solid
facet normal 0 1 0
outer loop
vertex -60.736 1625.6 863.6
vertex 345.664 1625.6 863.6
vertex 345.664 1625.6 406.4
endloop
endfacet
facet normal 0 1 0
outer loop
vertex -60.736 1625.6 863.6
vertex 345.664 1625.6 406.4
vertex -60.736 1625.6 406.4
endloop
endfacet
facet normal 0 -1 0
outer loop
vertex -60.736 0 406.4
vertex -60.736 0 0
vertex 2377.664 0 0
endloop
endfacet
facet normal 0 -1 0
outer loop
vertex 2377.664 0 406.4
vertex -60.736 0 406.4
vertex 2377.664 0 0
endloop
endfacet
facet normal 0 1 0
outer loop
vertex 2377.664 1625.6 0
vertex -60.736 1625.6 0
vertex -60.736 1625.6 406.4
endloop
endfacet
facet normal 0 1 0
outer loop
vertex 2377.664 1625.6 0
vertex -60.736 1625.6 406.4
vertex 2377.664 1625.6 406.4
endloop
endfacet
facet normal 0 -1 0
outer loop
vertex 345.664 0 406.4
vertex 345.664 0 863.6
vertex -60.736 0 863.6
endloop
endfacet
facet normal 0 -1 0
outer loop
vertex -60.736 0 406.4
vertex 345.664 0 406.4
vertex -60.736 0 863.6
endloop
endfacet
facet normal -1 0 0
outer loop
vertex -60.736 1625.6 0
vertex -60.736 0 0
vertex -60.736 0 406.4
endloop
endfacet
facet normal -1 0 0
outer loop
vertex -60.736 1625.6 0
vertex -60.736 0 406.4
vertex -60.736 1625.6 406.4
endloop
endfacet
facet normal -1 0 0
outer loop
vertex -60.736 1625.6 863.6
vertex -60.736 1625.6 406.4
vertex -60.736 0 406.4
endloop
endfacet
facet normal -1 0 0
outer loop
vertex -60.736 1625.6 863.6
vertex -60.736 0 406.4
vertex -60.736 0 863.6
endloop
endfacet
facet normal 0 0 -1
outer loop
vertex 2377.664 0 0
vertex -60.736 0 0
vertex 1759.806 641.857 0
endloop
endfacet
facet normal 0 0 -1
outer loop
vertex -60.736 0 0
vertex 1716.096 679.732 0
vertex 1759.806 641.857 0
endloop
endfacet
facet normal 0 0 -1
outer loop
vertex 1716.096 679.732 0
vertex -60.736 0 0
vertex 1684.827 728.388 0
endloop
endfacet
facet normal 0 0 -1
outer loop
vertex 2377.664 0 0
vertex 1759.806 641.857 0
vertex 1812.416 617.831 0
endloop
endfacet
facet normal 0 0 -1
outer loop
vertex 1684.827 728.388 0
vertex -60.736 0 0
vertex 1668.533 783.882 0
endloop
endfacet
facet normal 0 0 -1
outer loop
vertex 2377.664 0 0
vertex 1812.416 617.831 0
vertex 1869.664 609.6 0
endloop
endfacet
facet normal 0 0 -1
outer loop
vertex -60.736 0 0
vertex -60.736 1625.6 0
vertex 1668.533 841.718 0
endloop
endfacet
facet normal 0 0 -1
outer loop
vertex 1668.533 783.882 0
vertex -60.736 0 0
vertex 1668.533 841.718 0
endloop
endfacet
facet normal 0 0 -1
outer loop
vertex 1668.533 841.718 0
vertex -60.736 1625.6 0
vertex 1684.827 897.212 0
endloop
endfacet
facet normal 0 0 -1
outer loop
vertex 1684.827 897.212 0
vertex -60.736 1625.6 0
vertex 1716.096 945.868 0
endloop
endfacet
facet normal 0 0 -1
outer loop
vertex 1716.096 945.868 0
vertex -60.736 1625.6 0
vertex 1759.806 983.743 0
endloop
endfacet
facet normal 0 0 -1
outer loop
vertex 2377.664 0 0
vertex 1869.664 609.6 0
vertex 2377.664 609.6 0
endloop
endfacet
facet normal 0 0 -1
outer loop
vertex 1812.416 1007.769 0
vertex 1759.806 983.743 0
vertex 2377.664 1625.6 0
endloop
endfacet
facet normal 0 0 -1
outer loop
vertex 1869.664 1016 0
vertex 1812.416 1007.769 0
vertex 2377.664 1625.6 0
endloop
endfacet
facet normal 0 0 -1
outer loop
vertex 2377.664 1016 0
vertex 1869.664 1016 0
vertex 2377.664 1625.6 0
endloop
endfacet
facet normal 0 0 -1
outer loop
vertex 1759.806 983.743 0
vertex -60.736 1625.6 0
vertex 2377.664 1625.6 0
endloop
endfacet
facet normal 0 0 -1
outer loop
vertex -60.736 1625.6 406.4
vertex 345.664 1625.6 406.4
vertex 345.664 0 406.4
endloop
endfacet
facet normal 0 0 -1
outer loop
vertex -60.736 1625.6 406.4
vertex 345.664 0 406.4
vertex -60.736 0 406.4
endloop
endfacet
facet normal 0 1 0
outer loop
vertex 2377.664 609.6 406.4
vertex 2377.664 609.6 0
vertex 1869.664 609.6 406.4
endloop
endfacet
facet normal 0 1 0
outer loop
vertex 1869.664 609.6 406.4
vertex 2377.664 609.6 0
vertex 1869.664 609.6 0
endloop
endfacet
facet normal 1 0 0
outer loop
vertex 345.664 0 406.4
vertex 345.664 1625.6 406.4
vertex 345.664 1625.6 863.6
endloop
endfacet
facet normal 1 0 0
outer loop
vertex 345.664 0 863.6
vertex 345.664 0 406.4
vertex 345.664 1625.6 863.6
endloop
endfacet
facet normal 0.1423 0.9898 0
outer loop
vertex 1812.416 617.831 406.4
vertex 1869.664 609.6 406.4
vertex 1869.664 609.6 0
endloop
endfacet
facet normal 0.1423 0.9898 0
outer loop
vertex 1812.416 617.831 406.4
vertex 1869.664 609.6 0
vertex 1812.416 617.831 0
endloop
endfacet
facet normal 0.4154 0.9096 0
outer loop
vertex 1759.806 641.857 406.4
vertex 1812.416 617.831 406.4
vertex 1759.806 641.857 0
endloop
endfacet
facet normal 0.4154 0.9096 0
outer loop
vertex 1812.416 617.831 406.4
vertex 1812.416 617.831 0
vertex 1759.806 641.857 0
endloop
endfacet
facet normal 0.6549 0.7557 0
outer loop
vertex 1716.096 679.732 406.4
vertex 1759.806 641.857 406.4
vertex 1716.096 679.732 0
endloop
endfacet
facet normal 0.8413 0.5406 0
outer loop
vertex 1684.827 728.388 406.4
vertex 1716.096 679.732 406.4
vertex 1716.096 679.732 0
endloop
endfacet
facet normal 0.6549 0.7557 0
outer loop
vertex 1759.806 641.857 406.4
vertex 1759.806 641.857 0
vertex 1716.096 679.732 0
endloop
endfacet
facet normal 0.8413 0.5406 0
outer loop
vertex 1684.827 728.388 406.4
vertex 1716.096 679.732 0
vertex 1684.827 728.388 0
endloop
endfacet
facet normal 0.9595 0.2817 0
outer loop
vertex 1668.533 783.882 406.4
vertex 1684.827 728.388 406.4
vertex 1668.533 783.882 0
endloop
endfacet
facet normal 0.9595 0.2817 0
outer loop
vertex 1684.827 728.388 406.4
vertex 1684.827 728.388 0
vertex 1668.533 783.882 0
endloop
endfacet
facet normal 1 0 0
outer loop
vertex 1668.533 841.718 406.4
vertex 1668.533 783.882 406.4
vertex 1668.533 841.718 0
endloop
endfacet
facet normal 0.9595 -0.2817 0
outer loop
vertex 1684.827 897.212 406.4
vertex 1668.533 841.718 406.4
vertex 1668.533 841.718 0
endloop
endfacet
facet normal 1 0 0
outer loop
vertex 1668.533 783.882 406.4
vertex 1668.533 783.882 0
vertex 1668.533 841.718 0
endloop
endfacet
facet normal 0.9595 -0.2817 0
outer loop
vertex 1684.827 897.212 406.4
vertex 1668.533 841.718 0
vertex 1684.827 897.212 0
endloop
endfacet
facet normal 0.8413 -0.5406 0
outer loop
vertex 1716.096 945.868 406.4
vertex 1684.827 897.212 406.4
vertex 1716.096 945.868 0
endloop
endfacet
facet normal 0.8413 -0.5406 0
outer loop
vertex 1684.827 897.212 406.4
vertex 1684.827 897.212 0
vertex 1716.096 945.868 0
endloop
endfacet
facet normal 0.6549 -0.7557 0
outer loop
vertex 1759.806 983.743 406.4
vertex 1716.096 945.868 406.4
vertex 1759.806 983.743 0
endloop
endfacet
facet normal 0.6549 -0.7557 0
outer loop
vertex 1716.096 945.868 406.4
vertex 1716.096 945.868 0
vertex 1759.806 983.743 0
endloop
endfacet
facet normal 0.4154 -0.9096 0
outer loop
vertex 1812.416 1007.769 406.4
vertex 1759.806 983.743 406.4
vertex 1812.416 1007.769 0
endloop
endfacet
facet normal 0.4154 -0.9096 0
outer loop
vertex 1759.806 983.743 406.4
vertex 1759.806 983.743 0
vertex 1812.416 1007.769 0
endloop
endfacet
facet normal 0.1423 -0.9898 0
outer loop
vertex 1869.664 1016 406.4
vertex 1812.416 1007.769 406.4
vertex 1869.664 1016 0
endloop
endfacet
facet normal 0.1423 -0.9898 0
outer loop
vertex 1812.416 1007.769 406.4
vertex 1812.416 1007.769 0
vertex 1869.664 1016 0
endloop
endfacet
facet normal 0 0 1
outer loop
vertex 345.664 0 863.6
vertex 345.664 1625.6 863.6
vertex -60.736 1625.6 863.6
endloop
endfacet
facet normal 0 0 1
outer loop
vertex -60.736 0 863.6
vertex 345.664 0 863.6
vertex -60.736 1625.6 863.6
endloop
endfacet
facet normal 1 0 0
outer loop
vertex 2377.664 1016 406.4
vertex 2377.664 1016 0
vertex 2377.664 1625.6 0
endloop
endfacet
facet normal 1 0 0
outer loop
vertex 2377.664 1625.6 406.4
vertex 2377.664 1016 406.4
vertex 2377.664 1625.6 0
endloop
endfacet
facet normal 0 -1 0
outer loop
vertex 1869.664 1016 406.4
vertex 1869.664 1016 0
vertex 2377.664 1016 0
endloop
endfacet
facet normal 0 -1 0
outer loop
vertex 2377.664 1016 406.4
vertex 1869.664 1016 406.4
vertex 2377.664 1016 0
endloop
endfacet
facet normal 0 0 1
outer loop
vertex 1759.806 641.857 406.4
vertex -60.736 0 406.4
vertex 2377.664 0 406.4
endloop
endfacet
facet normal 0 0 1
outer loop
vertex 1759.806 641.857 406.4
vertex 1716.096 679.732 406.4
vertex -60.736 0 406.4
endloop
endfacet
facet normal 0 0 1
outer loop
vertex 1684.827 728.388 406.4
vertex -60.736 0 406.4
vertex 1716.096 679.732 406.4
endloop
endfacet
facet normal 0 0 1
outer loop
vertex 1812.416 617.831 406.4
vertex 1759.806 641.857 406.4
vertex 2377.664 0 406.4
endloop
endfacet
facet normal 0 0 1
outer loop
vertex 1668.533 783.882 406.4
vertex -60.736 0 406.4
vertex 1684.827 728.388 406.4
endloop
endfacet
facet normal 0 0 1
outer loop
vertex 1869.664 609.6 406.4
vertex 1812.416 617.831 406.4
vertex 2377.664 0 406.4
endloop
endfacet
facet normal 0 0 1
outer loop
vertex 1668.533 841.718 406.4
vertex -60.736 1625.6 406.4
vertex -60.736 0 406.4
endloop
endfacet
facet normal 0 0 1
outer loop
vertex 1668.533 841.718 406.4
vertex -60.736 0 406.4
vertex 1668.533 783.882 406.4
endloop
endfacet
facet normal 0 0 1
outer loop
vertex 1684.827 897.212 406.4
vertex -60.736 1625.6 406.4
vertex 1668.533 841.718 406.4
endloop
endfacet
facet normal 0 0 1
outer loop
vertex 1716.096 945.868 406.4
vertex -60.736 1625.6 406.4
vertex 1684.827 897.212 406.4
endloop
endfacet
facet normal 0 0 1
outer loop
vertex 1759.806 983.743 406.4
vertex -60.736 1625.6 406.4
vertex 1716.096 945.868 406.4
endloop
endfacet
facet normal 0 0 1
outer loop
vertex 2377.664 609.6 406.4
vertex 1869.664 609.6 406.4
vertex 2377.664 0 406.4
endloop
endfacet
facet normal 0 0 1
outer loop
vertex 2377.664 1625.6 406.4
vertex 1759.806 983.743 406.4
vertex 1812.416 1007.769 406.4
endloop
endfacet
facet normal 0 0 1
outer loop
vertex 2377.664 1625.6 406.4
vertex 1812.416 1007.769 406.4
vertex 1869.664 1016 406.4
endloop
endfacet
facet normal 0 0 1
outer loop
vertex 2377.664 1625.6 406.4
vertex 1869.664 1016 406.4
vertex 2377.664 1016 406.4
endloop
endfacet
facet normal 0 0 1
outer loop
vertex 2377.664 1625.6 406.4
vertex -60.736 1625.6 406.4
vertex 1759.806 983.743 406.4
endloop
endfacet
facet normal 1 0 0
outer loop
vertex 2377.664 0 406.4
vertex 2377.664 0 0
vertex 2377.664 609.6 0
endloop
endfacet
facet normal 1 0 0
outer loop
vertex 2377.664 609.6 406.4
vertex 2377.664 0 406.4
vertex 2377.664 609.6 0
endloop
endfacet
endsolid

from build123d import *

# Parameters (mm, degrees)
F0_W     = 2438.4
F0_H     = 1625.6
F1_DEPTH = 406.4
F3_DEPTH = 406.4
F4_W     = 406.4
F4_H     = 457.2
F5_DEPTH = 1625.6


with BuildPart() as f1:
    # F0 (on Top) → F1 (new body)
    with BuildSketch(Plane.XY):
        with Locations((1158.464234, 812.8)):
            Rectangle(F0_W, F0_H)
    extrude(amount=F1_DEPTH)

    # F2 (on face) → F3 (cut)
    with BuildSketch(Plane(origin=(0, 0, 0), x_dir=(1, 0, 0), z_dir=(0, 0, -1))):
        with BuildLine():
            Line((2377.664234, -1016), (2377.664234, -609.6))
            Line((2377.664234, -609.6), (1869.664234, -609.6))
            ThreePointArc((1869.664234, -609.6), (1666.464234, -812.8), (1869.664234, -1016))
            Line((1869.664234, -1016), (2377.664234, -1016))
        make_face()
    extrude(amount=-F3_DEPTH, mode=Mode.SUBTRACT)


with BuildPart() as f5:
    # F4 (on face) → F5 (new body)
    with BuildSketch(Plane(origin=(0, 1625.6, 0), x_dir=(-1, 0, 0), z_dir=(0, 1, 0))):
        with Locations((-142.464234, 635)):
            Rectangle(F4_W, F4_H)
    extrude(amount=-F5_DEPTH)


solid = Compound([f1.part, f5.part])
